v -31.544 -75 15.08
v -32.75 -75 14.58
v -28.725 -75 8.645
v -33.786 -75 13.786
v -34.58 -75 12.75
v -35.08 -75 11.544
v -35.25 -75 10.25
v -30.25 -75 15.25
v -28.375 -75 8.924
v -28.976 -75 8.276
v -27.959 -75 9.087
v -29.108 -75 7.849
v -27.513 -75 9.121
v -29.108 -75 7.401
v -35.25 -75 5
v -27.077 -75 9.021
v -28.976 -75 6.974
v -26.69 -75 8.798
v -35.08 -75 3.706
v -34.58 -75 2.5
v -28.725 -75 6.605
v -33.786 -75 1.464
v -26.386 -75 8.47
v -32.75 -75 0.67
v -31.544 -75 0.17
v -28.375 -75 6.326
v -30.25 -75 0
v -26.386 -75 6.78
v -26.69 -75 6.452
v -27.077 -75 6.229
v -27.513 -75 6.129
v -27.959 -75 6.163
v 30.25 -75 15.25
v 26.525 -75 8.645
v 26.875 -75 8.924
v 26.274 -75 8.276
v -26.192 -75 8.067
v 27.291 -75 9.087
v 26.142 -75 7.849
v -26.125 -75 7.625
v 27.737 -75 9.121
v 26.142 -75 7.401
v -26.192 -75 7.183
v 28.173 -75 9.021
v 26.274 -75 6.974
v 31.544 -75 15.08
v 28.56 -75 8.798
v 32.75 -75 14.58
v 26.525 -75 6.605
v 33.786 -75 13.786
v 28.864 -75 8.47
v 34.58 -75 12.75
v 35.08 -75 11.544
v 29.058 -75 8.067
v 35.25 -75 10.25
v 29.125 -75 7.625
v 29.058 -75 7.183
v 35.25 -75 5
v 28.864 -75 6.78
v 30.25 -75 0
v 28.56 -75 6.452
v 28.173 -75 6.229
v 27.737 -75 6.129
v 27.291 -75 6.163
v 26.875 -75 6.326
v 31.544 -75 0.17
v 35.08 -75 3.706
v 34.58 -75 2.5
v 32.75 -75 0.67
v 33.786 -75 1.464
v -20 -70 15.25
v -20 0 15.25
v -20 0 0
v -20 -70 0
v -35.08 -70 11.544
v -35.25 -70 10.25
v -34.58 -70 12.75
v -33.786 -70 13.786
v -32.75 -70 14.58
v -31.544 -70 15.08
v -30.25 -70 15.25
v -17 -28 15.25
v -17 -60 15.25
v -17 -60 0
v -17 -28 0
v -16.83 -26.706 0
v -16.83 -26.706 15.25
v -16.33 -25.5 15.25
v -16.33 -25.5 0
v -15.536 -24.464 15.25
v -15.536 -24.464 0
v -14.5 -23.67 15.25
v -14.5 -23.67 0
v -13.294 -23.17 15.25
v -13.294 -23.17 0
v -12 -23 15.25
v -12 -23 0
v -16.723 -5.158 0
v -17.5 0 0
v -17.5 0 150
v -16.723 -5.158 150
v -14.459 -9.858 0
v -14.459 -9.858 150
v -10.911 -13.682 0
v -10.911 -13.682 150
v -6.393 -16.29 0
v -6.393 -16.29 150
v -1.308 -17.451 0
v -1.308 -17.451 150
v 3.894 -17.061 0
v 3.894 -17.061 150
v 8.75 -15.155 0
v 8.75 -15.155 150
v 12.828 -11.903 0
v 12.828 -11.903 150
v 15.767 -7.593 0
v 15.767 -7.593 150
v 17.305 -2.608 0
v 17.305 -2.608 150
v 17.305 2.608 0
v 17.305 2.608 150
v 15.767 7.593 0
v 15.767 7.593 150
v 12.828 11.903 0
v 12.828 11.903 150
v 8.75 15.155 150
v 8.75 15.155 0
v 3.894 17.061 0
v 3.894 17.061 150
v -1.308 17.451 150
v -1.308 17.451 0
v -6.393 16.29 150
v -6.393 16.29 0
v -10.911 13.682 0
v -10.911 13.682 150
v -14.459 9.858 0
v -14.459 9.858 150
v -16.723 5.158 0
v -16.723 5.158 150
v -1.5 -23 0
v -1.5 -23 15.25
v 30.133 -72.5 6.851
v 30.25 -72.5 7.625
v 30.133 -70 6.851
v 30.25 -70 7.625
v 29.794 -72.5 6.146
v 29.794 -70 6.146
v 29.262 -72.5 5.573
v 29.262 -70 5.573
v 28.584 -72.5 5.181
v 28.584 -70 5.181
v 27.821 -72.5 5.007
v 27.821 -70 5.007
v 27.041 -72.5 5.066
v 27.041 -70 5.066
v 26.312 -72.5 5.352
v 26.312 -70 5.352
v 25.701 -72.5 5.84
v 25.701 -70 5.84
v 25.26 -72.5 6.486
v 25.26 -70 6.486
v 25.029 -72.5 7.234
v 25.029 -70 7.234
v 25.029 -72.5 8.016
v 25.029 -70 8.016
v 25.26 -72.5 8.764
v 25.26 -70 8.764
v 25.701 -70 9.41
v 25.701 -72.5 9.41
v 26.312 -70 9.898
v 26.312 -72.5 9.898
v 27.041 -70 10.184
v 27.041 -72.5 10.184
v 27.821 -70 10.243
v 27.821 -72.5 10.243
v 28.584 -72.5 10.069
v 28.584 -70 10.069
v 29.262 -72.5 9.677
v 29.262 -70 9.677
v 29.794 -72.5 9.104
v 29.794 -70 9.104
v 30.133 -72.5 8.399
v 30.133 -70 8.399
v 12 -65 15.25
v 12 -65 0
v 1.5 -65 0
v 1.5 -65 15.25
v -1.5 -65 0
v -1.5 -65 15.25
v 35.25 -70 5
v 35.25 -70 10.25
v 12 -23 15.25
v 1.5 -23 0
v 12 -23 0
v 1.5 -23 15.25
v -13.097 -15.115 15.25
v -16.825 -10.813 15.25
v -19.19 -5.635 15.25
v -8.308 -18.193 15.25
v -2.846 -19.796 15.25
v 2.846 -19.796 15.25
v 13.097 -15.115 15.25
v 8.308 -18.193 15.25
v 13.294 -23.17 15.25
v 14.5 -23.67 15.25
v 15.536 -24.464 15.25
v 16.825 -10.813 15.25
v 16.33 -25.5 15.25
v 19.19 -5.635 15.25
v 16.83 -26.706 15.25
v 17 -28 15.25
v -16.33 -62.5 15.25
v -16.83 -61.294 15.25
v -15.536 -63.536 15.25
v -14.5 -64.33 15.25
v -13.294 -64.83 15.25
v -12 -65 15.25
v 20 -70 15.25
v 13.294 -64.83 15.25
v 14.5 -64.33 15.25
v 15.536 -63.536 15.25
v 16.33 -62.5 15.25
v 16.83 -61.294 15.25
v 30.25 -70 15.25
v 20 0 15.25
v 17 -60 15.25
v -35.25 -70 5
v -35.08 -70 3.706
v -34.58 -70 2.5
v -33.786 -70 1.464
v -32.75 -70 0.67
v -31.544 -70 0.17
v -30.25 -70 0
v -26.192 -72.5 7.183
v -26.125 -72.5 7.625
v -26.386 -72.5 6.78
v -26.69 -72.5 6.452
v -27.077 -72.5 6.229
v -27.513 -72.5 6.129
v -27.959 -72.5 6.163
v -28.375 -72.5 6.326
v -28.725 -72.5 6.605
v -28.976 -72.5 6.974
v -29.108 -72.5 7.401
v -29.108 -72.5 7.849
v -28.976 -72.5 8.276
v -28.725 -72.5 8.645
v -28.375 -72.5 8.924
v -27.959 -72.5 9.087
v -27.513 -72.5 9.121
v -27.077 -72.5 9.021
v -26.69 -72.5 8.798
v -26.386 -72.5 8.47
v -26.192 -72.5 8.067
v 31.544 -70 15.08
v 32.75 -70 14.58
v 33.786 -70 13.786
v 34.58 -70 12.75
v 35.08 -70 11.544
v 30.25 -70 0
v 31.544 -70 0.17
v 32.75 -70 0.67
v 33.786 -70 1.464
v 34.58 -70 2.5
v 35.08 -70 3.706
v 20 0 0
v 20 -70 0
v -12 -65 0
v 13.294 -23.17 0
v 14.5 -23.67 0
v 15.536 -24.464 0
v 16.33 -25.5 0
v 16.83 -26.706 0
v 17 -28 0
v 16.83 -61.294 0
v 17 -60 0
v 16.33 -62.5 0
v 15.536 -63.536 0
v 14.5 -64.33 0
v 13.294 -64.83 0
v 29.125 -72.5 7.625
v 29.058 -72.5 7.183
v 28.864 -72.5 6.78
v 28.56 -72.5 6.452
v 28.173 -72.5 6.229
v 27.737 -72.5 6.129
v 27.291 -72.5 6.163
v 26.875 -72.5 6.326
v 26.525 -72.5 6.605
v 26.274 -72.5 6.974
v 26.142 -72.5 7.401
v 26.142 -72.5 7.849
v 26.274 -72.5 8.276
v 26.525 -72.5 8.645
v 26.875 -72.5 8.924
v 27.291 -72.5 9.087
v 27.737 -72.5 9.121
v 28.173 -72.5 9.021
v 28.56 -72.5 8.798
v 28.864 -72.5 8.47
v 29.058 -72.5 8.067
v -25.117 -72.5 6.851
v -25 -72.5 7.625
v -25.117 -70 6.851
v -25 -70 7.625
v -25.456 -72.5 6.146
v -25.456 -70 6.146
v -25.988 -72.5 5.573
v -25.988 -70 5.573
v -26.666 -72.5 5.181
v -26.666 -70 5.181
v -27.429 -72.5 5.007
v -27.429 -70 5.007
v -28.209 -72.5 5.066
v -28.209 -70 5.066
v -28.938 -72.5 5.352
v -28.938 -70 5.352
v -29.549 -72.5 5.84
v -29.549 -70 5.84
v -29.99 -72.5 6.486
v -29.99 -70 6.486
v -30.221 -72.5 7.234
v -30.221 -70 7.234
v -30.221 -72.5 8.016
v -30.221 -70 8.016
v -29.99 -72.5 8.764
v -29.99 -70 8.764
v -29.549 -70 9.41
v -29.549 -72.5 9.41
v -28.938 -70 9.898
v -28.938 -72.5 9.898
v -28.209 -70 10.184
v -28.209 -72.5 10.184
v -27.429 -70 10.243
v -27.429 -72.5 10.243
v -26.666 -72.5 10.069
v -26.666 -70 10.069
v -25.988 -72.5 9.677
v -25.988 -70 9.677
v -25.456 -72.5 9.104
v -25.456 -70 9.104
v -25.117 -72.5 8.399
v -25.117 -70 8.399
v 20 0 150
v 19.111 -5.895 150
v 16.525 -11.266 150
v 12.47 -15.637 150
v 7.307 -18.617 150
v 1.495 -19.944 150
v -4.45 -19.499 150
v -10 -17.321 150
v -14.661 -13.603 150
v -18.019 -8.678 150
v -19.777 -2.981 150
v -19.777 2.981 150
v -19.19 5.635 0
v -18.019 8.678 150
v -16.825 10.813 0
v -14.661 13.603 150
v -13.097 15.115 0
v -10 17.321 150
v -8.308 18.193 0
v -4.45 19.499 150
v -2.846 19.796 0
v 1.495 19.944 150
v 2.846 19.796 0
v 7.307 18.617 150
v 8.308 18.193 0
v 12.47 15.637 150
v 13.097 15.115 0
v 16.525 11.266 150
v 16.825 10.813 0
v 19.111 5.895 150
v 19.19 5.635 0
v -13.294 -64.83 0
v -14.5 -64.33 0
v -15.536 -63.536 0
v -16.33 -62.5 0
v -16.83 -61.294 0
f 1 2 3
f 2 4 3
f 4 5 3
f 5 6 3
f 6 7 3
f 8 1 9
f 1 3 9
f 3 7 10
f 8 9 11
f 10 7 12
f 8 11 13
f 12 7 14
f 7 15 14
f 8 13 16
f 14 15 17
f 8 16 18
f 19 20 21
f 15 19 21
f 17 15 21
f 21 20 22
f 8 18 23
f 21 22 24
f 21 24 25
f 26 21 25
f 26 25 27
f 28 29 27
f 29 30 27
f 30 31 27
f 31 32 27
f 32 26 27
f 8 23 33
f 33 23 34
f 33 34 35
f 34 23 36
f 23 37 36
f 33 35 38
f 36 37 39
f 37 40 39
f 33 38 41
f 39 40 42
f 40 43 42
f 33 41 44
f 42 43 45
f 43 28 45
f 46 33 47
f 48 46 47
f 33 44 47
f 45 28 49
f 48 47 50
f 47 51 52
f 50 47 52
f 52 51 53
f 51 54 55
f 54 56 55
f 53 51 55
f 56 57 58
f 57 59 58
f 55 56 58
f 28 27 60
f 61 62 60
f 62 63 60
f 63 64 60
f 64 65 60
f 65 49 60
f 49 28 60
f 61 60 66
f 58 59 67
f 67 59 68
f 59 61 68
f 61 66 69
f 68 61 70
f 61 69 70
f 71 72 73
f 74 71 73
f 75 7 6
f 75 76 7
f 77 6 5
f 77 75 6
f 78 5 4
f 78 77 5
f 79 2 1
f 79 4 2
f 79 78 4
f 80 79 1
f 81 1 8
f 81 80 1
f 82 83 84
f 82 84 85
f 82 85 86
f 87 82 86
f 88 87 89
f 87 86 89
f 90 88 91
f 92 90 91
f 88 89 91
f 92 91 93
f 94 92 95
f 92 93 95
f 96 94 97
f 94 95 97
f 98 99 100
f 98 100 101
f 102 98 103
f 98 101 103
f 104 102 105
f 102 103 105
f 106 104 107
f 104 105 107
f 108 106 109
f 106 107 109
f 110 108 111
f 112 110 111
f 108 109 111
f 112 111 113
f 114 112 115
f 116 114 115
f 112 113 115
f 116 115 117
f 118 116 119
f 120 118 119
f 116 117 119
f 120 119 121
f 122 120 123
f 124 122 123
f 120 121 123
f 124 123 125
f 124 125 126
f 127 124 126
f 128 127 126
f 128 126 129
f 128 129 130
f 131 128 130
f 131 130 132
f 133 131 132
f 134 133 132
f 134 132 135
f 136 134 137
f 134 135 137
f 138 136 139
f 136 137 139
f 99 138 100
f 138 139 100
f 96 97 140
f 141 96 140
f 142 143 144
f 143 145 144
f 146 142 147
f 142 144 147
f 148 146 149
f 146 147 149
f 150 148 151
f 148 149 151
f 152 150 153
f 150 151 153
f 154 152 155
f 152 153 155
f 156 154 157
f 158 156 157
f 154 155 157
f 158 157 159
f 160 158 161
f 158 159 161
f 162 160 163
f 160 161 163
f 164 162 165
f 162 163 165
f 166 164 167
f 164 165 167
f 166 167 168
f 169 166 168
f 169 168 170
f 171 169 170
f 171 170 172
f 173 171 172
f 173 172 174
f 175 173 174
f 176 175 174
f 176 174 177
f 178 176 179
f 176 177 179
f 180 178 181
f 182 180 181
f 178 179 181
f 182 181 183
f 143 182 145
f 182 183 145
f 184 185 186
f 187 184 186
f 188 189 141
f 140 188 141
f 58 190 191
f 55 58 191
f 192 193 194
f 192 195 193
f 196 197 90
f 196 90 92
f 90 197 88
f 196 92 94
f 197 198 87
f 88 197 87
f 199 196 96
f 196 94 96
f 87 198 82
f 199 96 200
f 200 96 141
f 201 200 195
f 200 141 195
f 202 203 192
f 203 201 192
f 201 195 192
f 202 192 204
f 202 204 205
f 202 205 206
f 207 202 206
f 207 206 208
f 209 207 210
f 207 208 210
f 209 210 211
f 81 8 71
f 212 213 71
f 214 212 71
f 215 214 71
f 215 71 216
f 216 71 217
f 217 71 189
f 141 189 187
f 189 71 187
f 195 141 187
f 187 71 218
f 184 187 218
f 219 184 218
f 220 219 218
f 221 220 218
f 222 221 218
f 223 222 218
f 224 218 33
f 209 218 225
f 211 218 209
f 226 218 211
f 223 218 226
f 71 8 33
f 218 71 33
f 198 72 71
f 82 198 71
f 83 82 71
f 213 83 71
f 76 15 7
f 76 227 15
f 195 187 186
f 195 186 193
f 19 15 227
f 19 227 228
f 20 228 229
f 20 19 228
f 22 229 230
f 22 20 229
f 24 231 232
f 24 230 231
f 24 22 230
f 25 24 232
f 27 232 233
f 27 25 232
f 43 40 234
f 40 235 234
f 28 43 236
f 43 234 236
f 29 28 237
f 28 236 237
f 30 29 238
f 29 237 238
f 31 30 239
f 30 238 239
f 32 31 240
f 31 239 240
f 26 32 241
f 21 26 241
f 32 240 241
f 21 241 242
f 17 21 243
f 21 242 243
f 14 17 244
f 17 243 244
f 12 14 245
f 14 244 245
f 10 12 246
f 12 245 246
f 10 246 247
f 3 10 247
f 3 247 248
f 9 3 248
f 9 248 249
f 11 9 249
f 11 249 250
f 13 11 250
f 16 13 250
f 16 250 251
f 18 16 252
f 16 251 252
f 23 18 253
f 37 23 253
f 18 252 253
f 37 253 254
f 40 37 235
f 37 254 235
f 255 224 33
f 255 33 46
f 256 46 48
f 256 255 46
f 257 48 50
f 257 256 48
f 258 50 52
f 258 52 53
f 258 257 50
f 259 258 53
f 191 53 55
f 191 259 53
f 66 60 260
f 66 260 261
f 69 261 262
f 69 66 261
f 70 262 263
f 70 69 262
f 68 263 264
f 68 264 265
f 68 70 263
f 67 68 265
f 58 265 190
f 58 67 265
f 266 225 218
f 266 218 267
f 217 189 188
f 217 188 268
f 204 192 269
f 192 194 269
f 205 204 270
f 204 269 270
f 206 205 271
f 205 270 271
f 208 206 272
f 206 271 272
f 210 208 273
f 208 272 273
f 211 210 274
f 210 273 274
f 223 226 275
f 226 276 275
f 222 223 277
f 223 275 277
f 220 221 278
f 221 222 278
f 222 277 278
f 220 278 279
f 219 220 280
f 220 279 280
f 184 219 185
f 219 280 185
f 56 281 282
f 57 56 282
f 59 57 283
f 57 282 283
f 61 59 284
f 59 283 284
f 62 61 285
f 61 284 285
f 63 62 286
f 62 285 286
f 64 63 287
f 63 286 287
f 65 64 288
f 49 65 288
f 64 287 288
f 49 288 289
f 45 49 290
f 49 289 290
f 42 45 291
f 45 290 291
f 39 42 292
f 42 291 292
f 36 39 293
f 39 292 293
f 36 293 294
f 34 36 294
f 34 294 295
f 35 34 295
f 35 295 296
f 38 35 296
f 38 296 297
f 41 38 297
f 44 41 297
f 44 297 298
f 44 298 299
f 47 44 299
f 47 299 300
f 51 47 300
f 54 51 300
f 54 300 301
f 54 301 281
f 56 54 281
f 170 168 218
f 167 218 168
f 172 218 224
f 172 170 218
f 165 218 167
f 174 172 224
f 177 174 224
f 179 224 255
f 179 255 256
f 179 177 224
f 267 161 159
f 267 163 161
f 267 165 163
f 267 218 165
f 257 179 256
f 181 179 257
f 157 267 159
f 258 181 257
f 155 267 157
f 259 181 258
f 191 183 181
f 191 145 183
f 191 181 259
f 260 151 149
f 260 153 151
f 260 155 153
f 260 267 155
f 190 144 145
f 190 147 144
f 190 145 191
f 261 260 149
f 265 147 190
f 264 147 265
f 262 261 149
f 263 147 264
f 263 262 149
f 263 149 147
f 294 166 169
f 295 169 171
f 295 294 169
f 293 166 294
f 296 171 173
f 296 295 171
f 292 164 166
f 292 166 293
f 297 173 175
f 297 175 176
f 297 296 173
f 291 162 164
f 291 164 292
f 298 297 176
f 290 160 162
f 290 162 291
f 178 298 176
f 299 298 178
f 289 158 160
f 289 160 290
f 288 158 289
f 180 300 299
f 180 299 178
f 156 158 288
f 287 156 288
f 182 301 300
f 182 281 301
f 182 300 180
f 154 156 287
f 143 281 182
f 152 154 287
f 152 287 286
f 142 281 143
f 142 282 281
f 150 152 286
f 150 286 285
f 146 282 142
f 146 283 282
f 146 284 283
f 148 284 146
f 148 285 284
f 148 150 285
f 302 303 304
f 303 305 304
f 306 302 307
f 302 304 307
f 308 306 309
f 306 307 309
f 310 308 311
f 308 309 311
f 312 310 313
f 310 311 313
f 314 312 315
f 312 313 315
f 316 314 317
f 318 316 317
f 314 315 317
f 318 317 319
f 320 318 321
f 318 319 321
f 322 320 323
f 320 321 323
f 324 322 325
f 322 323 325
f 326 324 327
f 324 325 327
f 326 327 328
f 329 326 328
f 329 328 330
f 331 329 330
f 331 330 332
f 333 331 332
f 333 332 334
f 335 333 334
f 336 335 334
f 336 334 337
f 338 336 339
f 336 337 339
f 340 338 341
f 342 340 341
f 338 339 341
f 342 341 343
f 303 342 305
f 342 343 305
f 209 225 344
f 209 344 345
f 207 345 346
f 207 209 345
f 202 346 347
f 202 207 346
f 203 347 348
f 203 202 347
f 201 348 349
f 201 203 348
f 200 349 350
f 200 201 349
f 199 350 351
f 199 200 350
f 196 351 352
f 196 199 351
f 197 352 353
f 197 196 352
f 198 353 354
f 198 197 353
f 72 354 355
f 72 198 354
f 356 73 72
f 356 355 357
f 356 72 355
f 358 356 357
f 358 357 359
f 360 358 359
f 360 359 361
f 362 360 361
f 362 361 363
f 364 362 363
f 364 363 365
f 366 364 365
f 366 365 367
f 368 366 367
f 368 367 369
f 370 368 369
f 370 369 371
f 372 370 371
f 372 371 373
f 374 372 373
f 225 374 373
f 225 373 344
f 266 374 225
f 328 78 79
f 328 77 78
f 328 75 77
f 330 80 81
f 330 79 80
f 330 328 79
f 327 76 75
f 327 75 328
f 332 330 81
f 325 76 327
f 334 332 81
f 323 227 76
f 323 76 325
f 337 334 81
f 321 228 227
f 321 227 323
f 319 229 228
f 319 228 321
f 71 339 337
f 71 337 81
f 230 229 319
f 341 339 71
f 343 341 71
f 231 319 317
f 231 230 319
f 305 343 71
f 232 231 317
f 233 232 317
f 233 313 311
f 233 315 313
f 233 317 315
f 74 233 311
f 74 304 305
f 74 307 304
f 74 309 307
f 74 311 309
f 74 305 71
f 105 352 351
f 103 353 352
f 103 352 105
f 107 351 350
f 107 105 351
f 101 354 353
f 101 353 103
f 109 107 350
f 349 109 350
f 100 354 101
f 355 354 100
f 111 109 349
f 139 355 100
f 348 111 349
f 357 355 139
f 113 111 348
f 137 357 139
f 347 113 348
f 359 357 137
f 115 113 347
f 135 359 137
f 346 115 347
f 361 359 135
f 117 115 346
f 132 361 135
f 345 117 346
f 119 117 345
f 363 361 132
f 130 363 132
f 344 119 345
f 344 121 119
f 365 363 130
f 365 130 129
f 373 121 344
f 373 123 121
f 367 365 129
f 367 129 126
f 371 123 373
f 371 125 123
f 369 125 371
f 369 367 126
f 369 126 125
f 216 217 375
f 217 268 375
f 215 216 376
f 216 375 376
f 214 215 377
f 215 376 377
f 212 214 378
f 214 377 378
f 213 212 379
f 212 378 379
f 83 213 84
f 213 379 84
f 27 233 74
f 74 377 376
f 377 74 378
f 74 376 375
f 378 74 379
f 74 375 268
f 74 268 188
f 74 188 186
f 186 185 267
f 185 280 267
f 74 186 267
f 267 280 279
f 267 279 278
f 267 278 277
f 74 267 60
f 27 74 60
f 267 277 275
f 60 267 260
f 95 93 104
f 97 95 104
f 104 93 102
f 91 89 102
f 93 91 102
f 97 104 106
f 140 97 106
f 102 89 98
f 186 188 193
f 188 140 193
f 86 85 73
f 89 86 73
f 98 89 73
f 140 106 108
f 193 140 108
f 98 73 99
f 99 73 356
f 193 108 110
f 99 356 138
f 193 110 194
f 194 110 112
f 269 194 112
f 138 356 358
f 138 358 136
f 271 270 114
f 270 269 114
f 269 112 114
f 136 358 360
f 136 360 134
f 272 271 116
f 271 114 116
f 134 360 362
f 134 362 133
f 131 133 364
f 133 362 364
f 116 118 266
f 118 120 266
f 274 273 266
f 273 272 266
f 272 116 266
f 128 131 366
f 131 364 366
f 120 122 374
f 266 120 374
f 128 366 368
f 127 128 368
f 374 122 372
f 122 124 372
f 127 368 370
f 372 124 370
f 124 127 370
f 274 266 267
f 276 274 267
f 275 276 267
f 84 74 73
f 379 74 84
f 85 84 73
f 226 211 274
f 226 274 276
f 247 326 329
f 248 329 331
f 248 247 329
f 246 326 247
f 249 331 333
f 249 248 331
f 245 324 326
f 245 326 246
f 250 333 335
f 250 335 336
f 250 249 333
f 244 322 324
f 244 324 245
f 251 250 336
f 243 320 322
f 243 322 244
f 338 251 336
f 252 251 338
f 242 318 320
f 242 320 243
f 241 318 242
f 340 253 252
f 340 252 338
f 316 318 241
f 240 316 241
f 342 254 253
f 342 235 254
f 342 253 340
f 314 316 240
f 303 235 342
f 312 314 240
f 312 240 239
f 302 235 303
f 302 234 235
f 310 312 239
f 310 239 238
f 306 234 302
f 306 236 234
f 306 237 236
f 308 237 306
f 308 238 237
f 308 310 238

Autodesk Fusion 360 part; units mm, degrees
sketch "Sketch1" plane through (0, 0, 0) normal (0, 0, 1) x (1, 0, 0)
  circle A0 centre (0, 0) radius 20
  dimension "d1" = 40
extrude "Extrude1" add sketch "Sketch1" along normal blind 150 makes body 1
sketch "Sketch2" plane through (0, 0, 0) normal (0, 1, 0) x (1, 0, 0)
  line L0 (-20, 0) -> (20, 0) construction
  line L1 (-20, -150) -> (20, -150) construction
  line L2 (0, -150) -> (0, 0) construction
  line L3 (-20, -150) -> (-20, 0) construction
  line L4 (-20, 0) -> (-35.25, 0)
  line L5 (-35.25, 0) -> (-35.25, -15.25)
  line L6 (-35.25, -15.25) -> (-20, -15.25)
  line L7 (-27.625, -15.25) -> (-27.625, 0) construction
  circle A0 centre (-27.625, -7.625) radius 2.625
  circle A1 centre (-27.625, -7.625) radius 1.5
  line L8 (-20, -15.25) -> (0, -15.25)
  line L9 (-20, 0) -> (0, 0)
  line L10 (20, -15.25) -> (0, -15.25)
  line L11 (35.25, -15.25) -> (20, -15.25)
  line L12 (35.25, 0) -> (35.25, -15.25)
  line L13 (20, 0) -> (35.25, 0)
  line L14 (20, 0) -> (0, 0)
  circle A2 centre (27.625, -7.625) radius 2.625
  circle A3 centre (27.625, -7.625) radius 1.5
  line L15 (20, -15.25) -> (20, 0)
  line L16 (-20, -15.25) -> (-20, 0)
  line L17 (20, -15.25) -> (20, 0)
  line L18 (-20, -15.25) -> (-20, 0)
  point P0 (-27.625, -7.625)
  dimension "d5" = 5.25
  dimension "d6" = 3
  dimension "d7" = 5
  dimension "d8" = 5
  dimension "d13" = 5
ref_plane "WorkPlane1" through (0, -20, 103.4458) normal (0, -1, 0) x (-1, 0, 0)
extrude "Extrude2" add sketch "Sketch2" against normal blind 55 from surface at -20 separate body contours L4 L5 L6 L16 L18 | L8 L9 L10 L14 L15 L16 L17 L18 | L11 L12 L13 L15 L17 | A0 | A2 makes body 2
extrude "Extrude3" add sketch "Sketch2" along normal blind 20 from surface at -20 contours L8 L9 L10 L14 L15 L16 L17 L18 bodies 1 2
move_face "OffsetFaces1" offset -50 2 faces at (27.6624, -20, 13.2069) (-27.5876, -20, 13.2069) on bodies 1
extrude "Extrude4" cut sketch "Sketch2" against normal blind 2.5 from surface at -70 contours A0 | A2 bodies 1
fillet "Fillet1" radius 5 4 edges at (35.25, -72.5, 15.25) (35.25, -72.5, 0) (-35.25, -72.5, 15.25) (-35.25, -72.5, 0) on bodies 1
sketch "Sketch3" plane through (0, 0, 15.25) normal (0, 0, 1) x (-1, 0, 0)
  line L0 (30.25, 70) -> (30.25, 75)
  line L1 (30.25, 75) -> (-30.25, 75)
  line L2 (-30.25, 75) -> (-30.25, 70)
  line L3 (-30.25, 70) -> (-20, 70)
  line L4 (-20, 70) -> (-20, 0)
  arc A0 (20, 0) -> (-20, 0) centre (0, 0) ccw
  line L5 (20, 0) -> (20, 70)
  line L6 (20, 70) -> (30.25, 70)
  line L7 (-30.25, 75) -> (30.25, 75)
  line L8 (20, 70) -> (20, 0)
  line L9 (-20, 70) -> (-20, 0)
  circle A1 centre (0, 0) radius 20
  line L10 (0, 75) -> (0, 20) construction
  line L11 (17, 23) -> (-17, 23)
  line L12 (-17, 23) -> (-17, 65)
  line L13 (-17, 65) -> (17, 65)
  line L14 (17, 65) -> (17, 23)
  circle A2 centre (0, 0) radius 17.5
  line L15 (-1.5, 65) -> (-1.5, 23)
  line L16 (1.5, 65) -> (1.5, 23)
  dimension "d23" = 3
  dimension "d24" = 3
  dimension "d25" = 5
  dimension "d26" = 3
  dimension "d31" = -2.5
  dimension "d41" = 1.5
extrude "Extrude5" cut sketch "Sketch3" against normal up to surface (15.25 mm away) contours L11 L13 L14 L16 | L11 L12 L13 L15 bodies 1
fillet "Fillet2" radius 5 4 edges at (-17, -65, 7.625) (-17, -23, 7.625) (17, -23, 7.625) (17, -65, 7.625) on bodies 1
extrude "Extrude6" cut sketch "Sketch3" against normal up to surface (150 mm away) from surface at 134.75 contours A2 bodies 1
sketch "Sketch4" plane through (20, 0, 0) normal (1, 0, 0) x (0, 1, 0)
  line L0 (-70, 15.25) -> (-70, 0)
  line L1 (-70, 0) -> (0, 0)
  line L2 (0, 0) -> (0, 15.25)
  line L3 (0, 15.25) -> (-70, 15.25)
  line L4 (-66, 4) -> (-4, 4)
  line L5 (-4, 4) -> (-4, 11.25)
  line L6 (-4, 11.25) -> (-66, 11.25)
  line L7 (-66, 11.25) -> (-66, 4)
  line L8 (0, 15.25) -> (-20, 15.25)
  line L9 (-20, 15.25) -> (-20, 0) construction
  line L10 (-24, 15.25) -> (-24, 0)
  dimension "d35" = -4
  dimension "d36" = 4
